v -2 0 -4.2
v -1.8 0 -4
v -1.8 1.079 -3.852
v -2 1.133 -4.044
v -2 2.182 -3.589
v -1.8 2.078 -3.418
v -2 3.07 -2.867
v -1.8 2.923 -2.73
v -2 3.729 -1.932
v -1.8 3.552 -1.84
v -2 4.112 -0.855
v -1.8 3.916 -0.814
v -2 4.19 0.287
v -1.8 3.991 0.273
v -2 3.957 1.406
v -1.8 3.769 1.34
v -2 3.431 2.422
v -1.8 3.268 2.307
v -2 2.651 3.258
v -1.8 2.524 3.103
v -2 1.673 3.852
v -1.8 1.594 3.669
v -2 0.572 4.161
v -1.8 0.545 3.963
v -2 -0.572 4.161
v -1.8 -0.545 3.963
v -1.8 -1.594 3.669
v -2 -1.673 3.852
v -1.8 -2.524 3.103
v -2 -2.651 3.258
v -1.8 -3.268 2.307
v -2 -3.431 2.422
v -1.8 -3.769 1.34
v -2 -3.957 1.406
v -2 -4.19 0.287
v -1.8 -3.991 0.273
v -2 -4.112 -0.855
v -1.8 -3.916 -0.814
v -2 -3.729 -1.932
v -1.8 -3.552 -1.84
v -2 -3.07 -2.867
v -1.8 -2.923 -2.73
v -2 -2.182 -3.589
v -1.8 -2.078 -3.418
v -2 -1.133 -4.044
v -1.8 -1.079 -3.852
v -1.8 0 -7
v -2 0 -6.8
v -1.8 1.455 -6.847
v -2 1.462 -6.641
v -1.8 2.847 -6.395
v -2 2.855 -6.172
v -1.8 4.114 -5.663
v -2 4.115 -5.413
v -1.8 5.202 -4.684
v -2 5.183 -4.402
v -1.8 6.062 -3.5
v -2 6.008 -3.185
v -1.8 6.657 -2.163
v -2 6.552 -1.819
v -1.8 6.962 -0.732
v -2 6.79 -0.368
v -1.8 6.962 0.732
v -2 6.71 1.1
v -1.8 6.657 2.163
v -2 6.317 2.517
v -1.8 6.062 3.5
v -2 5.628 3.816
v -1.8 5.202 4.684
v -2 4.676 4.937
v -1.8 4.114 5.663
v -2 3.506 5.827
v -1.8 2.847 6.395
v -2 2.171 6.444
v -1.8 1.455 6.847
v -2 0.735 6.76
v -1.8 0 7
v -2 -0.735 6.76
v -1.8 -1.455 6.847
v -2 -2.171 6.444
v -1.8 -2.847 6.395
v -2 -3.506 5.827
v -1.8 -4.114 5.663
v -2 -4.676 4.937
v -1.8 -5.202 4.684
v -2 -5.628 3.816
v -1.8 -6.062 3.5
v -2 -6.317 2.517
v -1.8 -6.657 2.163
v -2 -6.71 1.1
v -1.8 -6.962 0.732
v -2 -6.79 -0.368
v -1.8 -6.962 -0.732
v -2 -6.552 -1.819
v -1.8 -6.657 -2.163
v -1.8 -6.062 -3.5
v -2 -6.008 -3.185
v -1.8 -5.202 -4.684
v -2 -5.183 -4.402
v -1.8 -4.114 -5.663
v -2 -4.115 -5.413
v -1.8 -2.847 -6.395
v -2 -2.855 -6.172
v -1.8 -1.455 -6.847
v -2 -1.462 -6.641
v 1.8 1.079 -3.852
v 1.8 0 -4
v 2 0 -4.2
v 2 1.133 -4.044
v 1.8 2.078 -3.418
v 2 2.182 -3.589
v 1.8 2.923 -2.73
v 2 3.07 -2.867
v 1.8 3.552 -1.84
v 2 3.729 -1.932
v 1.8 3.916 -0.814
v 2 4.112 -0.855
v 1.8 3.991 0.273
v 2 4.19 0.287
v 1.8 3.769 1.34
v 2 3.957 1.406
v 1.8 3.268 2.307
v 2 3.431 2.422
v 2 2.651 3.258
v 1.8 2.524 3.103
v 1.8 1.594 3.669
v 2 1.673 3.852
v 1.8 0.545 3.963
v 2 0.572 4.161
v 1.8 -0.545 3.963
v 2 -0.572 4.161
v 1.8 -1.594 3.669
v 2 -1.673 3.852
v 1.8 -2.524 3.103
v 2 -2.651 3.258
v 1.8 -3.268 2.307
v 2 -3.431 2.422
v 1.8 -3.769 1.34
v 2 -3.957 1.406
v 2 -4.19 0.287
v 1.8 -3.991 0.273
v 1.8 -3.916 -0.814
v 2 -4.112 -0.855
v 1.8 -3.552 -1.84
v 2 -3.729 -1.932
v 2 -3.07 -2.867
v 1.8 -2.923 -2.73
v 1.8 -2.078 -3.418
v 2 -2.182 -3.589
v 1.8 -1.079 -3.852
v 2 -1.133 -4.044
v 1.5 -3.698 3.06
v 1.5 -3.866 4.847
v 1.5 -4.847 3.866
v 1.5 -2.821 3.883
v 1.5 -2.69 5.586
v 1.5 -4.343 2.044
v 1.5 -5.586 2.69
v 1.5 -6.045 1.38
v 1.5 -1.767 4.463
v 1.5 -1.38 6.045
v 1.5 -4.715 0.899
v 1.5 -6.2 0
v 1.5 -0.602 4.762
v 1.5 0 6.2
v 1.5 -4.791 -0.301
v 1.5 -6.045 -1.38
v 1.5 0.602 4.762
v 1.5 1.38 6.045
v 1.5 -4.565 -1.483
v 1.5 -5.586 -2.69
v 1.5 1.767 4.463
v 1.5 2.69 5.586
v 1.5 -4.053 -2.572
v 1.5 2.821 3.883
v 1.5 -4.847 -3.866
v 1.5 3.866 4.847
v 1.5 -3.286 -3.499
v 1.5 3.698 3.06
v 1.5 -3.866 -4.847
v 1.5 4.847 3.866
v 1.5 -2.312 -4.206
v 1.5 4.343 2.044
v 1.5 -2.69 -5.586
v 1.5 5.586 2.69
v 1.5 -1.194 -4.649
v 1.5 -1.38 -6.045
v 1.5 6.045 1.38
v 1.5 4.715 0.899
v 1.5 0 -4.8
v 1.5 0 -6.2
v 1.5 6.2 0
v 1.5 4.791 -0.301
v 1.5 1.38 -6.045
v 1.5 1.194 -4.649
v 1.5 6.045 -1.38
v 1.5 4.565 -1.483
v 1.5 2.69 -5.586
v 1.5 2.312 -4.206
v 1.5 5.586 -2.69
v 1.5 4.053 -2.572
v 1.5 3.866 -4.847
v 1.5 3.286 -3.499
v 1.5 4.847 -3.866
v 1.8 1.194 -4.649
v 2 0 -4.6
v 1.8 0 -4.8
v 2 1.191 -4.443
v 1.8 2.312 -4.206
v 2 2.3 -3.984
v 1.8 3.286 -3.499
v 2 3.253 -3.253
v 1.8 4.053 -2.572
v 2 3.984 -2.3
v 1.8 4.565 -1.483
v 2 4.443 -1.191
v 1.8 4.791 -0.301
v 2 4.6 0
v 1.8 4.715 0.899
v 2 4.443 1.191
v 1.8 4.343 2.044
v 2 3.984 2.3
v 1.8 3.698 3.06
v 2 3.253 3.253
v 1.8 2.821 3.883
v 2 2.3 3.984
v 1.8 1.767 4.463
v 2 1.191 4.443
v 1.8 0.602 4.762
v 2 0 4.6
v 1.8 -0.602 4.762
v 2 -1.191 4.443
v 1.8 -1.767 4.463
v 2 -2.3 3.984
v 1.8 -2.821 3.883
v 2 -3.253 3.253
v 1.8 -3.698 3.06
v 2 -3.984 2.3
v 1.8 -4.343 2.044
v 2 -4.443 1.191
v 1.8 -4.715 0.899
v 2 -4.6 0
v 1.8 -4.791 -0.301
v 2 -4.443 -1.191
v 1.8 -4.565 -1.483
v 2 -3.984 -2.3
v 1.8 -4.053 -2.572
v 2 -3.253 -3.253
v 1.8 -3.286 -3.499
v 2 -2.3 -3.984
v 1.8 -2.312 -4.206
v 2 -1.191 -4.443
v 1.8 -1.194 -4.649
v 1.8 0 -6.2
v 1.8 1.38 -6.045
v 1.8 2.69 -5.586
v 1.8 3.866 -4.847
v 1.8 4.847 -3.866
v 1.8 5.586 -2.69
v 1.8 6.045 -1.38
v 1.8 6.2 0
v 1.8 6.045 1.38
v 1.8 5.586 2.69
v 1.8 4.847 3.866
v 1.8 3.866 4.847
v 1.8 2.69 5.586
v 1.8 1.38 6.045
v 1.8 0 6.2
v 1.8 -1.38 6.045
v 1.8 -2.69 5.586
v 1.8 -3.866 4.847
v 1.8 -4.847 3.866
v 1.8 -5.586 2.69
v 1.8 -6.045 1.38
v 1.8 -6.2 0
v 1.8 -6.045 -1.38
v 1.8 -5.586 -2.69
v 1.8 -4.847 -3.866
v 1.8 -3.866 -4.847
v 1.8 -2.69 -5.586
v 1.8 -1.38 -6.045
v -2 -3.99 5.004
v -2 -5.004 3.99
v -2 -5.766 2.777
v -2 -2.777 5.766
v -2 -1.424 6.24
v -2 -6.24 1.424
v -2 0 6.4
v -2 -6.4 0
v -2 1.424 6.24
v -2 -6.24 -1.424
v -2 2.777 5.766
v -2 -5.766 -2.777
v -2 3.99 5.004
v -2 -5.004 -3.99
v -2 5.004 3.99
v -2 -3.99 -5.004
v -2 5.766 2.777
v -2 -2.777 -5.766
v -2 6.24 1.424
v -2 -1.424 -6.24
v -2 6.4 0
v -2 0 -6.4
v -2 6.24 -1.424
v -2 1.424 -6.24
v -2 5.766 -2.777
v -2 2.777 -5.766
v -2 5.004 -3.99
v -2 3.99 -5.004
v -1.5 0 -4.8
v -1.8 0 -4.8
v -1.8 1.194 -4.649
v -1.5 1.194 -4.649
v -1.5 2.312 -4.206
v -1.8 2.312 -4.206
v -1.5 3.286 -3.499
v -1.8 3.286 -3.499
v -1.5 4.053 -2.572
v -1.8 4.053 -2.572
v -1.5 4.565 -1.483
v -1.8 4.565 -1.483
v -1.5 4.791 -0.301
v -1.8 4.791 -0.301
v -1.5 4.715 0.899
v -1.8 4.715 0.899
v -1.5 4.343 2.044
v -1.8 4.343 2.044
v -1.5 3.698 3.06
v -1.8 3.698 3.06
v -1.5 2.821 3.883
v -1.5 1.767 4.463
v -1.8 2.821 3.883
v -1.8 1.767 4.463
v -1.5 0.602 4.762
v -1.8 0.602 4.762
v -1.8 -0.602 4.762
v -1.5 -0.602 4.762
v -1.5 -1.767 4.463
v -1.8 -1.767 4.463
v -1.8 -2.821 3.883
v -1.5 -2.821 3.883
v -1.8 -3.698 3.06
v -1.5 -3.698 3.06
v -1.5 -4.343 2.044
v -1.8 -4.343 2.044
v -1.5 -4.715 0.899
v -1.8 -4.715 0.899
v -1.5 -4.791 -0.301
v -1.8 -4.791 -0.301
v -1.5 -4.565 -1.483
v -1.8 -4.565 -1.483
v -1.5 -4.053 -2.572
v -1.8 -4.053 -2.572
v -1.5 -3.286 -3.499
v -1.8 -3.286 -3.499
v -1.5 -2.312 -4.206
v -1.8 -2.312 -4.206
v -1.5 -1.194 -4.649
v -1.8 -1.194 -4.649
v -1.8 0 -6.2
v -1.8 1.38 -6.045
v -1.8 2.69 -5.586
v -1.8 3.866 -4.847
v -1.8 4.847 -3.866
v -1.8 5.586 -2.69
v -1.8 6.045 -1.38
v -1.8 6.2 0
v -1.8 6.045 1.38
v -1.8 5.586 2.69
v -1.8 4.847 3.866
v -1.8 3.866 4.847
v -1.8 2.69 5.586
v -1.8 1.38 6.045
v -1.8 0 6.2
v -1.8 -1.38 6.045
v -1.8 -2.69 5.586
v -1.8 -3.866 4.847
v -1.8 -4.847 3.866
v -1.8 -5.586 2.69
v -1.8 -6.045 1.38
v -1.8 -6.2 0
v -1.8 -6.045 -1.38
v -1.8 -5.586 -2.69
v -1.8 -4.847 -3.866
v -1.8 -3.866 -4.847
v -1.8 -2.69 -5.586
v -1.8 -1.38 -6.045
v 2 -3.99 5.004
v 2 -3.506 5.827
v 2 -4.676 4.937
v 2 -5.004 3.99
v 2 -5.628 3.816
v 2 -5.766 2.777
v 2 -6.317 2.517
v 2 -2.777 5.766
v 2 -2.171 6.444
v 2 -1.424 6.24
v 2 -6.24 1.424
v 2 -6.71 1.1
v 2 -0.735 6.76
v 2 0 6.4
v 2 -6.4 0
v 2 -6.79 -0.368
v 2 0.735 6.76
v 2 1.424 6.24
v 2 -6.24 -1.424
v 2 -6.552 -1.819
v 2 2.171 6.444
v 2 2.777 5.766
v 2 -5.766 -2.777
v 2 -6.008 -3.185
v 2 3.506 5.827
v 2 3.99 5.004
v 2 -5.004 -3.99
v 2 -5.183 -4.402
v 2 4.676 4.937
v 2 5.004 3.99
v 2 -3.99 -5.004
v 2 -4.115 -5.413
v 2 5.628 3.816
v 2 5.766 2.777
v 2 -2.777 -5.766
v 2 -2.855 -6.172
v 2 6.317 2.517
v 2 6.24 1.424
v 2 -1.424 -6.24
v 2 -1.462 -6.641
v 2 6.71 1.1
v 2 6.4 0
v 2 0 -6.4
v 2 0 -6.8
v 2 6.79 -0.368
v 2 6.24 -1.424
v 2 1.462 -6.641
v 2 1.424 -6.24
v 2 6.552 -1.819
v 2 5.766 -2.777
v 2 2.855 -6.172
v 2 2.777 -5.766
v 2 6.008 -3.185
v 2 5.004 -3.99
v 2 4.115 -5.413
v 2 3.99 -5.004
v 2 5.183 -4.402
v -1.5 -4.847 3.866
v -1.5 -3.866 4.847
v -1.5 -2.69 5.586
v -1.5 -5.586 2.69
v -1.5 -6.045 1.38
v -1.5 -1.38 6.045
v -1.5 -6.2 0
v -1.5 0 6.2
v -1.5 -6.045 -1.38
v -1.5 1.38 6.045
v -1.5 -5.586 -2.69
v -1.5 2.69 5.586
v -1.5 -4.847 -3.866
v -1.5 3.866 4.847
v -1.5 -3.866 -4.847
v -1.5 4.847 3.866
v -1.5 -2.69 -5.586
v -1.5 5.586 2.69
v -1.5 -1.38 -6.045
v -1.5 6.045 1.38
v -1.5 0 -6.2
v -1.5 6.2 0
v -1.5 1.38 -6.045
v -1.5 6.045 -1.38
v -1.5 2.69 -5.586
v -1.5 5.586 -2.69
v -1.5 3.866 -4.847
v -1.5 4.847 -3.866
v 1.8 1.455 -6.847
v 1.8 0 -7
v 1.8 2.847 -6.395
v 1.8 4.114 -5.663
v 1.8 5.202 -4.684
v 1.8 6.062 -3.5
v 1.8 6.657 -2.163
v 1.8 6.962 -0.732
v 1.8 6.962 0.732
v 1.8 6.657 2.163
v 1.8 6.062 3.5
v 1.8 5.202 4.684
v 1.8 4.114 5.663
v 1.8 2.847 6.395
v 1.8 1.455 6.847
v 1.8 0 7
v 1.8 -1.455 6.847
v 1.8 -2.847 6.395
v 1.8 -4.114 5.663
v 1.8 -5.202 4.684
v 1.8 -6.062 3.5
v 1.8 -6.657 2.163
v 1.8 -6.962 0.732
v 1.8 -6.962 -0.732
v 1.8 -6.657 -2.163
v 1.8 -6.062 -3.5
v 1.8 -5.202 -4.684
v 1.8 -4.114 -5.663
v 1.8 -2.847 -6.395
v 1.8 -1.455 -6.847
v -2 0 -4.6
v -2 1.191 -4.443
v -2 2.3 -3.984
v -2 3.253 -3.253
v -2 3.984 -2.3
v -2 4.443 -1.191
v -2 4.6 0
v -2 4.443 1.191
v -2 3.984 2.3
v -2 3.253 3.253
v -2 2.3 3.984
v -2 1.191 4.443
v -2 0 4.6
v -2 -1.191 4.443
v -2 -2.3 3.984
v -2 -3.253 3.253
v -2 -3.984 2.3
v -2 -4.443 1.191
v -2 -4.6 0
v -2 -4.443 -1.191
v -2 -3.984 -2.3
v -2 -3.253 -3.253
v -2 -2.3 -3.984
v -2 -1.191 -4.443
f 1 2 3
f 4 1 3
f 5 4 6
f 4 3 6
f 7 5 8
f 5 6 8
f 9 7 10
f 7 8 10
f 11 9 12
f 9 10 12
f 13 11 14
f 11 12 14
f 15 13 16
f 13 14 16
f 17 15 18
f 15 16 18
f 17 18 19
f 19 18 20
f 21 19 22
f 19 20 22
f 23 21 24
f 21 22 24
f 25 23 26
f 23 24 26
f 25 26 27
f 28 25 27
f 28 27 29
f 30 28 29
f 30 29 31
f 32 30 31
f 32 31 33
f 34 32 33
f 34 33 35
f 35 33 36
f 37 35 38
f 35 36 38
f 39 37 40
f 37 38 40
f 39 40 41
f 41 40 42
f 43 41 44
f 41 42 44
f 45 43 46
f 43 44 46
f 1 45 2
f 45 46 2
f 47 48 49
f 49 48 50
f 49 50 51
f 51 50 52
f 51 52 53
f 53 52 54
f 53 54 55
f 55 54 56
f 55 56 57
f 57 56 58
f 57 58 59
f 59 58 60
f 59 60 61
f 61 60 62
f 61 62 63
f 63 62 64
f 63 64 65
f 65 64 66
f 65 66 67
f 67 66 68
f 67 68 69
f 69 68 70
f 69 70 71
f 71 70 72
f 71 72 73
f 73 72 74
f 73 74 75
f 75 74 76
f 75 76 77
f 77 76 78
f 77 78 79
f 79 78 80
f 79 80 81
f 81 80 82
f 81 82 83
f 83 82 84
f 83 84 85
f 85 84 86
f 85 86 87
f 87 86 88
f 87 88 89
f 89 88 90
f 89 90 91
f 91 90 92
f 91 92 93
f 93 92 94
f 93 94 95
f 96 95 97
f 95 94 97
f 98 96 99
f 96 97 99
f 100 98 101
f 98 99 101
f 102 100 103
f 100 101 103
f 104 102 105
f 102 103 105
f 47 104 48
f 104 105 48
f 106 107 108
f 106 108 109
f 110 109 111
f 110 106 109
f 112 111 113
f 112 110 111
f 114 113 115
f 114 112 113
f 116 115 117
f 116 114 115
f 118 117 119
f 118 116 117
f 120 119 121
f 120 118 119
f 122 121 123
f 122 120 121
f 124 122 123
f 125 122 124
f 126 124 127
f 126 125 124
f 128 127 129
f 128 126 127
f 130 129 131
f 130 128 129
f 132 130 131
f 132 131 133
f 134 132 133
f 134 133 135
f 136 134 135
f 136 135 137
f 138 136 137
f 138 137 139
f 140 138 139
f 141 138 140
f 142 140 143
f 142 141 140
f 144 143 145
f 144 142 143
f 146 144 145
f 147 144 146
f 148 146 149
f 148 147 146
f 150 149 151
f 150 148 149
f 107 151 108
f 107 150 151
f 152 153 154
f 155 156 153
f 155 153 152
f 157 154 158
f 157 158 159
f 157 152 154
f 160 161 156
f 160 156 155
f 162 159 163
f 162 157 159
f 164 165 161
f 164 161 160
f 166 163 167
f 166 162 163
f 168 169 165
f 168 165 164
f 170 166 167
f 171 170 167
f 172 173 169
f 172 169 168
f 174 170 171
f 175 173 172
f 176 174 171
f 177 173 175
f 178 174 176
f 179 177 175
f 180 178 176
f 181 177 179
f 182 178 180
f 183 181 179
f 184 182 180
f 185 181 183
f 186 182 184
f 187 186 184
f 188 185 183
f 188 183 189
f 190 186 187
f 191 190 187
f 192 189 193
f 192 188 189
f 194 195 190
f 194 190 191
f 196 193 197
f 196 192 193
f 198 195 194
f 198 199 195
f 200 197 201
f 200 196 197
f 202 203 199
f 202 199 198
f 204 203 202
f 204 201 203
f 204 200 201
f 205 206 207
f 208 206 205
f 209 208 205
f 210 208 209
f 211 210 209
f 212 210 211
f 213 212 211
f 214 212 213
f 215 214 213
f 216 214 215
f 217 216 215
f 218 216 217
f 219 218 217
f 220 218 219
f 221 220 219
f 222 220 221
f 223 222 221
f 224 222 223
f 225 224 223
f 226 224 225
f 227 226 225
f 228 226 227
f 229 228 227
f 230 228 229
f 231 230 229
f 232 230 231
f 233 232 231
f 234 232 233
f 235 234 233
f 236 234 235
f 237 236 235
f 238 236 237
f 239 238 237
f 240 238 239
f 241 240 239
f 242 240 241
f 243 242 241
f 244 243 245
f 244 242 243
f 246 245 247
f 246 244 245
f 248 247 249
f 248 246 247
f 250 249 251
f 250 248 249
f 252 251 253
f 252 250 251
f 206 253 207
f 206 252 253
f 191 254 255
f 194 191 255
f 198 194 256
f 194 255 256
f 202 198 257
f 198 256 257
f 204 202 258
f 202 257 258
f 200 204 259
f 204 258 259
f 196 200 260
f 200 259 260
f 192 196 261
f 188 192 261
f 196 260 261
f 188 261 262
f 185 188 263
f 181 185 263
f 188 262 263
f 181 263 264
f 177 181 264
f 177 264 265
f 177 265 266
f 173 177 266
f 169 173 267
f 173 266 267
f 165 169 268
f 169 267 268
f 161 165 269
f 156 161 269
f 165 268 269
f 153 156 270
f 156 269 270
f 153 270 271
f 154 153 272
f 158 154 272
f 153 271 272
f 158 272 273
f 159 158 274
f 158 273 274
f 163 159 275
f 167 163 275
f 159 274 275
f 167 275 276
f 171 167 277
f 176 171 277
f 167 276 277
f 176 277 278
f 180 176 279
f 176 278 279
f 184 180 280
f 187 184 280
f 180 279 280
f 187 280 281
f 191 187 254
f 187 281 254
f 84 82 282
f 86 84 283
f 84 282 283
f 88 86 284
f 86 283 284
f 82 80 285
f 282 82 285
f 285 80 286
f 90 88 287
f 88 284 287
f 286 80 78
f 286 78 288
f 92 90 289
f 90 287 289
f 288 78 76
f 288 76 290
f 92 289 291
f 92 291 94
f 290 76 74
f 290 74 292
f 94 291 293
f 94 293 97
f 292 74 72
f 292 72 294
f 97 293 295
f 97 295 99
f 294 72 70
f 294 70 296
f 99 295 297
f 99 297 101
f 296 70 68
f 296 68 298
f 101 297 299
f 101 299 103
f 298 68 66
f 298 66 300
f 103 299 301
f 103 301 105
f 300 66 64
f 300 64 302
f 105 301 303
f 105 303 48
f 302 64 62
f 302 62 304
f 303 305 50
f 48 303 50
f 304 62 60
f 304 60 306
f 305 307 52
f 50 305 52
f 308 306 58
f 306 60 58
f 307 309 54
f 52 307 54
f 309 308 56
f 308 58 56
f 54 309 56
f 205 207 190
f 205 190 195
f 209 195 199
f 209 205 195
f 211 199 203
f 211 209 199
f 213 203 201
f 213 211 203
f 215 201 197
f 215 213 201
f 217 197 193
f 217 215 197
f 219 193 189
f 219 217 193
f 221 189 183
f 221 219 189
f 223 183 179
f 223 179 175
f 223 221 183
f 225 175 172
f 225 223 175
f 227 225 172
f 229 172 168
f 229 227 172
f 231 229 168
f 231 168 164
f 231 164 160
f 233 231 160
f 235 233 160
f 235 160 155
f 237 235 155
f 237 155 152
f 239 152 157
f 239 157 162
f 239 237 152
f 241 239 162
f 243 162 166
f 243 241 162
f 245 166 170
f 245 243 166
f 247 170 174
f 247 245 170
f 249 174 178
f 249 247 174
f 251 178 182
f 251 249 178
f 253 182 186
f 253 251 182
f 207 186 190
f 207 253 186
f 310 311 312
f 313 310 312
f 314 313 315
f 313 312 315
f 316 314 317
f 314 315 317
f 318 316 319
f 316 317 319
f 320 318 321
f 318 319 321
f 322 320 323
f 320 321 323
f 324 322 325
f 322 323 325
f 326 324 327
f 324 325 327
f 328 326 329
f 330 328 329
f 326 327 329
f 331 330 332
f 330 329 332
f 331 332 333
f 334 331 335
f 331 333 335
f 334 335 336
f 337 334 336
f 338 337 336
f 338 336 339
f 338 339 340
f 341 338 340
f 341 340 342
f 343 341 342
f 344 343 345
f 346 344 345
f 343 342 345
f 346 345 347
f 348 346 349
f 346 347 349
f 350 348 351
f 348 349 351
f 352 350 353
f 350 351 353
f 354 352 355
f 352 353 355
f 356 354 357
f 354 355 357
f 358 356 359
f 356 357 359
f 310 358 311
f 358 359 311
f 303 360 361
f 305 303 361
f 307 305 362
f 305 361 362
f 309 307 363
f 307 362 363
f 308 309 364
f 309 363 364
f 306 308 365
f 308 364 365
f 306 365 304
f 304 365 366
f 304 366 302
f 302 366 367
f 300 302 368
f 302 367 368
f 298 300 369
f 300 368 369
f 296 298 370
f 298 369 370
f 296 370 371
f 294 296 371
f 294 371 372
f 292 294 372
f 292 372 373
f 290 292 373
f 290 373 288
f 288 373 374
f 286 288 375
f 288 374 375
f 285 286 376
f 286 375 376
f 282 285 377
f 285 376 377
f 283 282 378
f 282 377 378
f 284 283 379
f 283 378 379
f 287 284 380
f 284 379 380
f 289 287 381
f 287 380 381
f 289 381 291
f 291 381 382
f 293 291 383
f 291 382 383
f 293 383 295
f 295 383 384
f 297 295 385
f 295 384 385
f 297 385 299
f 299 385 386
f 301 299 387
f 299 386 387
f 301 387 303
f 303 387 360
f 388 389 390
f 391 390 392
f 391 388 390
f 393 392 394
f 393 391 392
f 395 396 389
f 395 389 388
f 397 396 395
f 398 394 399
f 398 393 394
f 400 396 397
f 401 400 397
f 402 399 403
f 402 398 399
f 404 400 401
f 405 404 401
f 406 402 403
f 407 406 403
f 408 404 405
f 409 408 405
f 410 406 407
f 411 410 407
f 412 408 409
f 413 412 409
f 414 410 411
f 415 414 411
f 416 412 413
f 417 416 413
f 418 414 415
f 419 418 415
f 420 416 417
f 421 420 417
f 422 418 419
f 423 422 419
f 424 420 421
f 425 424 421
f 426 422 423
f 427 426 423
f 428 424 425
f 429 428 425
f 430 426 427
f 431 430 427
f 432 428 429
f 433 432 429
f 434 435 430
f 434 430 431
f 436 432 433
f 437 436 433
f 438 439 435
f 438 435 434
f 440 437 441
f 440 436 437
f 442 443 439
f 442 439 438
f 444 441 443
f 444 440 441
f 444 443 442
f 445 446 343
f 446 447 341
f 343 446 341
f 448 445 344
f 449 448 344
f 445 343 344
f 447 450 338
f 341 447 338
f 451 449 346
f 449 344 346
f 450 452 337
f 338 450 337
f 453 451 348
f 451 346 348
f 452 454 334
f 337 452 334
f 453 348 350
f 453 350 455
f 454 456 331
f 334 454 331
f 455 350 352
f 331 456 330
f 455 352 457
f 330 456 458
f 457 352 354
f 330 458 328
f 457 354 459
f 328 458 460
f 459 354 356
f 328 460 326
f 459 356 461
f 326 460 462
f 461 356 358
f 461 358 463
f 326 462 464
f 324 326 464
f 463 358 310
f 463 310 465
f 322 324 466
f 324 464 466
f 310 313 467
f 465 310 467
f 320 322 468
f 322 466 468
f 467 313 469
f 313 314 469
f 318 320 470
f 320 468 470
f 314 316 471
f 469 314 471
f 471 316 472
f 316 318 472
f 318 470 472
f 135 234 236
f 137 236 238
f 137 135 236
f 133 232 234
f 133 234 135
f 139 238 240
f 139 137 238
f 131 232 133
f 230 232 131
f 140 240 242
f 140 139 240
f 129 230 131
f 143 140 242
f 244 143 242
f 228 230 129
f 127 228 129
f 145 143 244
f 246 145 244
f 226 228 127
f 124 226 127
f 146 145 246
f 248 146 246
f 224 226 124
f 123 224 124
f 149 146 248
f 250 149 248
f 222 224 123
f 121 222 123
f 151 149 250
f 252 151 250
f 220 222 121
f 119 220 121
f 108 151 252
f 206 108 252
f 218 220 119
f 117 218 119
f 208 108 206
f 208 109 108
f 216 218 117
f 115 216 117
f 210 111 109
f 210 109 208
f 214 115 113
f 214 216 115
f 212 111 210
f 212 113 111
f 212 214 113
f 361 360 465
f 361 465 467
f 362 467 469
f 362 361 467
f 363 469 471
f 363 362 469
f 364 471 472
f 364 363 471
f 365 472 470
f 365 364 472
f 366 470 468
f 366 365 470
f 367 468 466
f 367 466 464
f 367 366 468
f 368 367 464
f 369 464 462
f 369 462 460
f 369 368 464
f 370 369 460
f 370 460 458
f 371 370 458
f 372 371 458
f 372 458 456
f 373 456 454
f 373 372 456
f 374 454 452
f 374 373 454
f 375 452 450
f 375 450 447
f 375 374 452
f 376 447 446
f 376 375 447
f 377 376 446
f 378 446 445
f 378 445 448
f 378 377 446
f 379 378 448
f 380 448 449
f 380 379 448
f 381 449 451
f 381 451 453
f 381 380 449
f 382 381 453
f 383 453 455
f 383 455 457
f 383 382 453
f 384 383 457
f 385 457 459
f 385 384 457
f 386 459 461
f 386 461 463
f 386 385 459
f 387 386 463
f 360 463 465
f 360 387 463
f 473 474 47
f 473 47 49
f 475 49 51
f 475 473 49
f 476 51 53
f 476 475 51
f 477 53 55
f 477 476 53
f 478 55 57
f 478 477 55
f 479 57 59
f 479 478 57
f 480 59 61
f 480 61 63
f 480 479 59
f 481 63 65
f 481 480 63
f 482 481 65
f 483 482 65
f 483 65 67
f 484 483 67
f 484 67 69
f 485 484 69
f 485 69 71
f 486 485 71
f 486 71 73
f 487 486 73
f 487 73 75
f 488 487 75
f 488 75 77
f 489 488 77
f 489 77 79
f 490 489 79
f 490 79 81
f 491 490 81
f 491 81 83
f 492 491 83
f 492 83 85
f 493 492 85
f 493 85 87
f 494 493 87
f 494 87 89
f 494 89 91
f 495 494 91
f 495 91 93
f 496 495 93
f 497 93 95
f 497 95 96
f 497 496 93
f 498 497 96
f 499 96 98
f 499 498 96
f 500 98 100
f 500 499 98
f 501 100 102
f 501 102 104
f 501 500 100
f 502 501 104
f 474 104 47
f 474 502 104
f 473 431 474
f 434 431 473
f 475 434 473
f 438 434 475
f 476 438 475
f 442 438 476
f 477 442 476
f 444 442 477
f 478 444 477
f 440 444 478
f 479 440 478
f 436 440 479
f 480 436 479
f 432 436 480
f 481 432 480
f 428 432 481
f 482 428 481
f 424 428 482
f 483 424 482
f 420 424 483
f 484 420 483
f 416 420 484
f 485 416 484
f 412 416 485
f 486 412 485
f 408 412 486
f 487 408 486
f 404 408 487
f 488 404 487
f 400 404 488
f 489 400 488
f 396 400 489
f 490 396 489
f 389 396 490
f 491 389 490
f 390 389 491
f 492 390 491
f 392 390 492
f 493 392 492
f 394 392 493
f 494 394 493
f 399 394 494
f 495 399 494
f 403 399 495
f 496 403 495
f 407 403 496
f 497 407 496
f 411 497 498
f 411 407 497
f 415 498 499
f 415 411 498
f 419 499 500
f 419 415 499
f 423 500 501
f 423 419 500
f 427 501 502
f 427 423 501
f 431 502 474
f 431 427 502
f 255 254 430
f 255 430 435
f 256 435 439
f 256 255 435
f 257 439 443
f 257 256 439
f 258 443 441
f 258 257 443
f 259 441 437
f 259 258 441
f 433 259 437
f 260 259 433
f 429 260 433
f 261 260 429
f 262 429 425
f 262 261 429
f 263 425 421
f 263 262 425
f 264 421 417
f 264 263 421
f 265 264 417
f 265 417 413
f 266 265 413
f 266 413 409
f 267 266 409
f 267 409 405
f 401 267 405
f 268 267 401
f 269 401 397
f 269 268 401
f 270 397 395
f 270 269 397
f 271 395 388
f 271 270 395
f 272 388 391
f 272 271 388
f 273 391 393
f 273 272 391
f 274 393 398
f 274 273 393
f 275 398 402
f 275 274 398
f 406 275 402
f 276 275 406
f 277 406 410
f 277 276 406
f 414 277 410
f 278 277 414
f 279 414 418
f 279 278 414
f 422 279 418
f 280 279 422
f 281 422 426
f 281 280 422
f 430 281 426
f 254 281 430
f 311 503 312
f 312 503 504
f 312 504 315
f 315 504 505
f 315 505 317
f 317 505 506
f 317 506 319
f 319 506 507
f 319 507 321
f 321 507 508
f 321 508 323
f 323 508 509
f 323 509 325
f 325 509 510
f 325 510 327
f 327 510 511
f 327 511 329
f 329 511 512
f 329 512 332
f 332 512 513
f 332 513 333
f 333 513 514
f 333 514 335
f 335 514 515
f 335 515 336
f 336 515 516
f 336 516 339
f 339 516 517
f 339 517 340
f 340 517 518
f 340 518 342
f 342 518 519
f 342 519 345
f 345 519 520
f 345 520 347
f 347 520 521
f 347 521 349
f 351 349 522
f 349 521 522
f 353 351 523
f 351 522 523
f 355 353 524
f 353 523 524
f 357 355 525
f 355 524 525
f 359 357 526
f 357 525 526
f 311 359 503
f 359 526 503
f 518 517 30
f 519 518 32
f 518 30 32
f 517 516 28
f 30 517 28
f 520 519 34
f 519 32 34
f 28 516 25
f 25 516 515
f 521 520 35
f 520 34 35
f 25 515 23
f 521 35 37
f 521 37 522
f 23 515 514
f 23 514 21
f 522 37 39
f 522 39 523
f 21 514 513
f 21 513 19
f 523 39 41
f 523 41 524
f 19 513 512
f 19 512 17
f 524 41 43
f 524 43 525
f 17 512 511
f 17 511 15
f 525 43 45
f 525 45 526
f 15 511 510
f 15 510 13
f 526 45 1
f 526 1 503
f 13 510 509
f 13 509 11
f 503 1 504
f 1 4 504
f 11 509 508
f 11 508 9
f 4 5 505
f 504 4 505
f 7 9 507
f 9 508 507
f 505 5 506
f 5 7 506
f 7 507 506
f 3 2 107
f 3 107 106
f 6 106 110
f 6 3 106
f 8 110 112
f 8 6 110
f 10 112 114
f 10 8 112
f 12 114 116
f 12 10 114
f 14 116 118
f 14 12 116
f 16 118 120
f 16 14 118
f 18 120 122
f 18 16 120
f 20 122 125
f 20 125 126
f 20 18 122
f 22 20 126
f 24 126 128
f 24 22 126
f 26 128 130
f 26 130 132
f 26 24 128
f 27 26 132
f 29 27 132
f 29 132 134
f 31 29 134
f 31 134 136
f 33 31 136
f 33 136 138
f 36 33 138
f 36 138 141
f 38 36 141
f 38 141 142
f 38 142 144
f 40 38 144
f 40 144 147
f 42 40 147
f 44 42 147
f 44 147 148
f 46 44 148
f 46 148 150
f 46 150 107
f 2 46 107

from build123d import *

# Parameters (mm, degrees)
SKETCH1_R           = 7
SKETCH1_R_2         = 4
BOSS_EXTRUDE1_DEPTH = 2
SKETCH2_R           = 6.2
SKETCH2_R_2         = 4.8
CUT_EXTRUDE1_DEPTH  = 0.5
CHAMFER1_SIZE       = 0.2


with BuildPart() as part:
    # Sketch1 → Boss-Extrude1 (new, symmetric)
    with BuildSketch(Plane(origin=(0, 0, 0), x_dir=(0, 0, -1), z_dir=(1, 0, 0))):
        Circle(SKETCH1_R)
        Circle(SKETCH1_R_2, mode=Mode.SUBTRACT)
    extrude(amount=BOSS_EXTRUDE1_DEPTH, both=True)

    # Sketch2 → Cut-Extrude1 (cut)
    with BuildSketch(Plane(origin=(2, 0, 0), x_dir=(0, 0, -1), z_dir=(1, 0, 0))):
        Circle(SKETCH2_R)
        Circle(SKETCH2_R_2, mode=Mode.SUBTRACT)
    cut_extrude1 = extrude(amount=-CUT_EXTRUDE1_DEPTH, mode=Mode.SUBTRACT)

    # Mirror1: Cut-Extrude1 across plane
    add(cut_extrude1.mirror(Plane(origin=(0, 0, 0), x_dir=(0, 0, 1), z_dir=(1, 0, 0))), mode=Mode.SUBTRACT)

    # Chamfer1
    chamfer1_edges = [part.edges().sort_by_distance(p)[0] for p in [
        (2, 0, 6.2),
        (2, 0, 4.8),
        (-2, 0, 4.8),
        (-2, 0, 6.2),
        (-2, 0, 7),
        (2, 0, 7),
        (-2, 0, 4),
        (2, 0, 4),
    ]]
    chamfer(chamfer1_edges, length=CHAMFER1_SIZE)


solid = part.part
